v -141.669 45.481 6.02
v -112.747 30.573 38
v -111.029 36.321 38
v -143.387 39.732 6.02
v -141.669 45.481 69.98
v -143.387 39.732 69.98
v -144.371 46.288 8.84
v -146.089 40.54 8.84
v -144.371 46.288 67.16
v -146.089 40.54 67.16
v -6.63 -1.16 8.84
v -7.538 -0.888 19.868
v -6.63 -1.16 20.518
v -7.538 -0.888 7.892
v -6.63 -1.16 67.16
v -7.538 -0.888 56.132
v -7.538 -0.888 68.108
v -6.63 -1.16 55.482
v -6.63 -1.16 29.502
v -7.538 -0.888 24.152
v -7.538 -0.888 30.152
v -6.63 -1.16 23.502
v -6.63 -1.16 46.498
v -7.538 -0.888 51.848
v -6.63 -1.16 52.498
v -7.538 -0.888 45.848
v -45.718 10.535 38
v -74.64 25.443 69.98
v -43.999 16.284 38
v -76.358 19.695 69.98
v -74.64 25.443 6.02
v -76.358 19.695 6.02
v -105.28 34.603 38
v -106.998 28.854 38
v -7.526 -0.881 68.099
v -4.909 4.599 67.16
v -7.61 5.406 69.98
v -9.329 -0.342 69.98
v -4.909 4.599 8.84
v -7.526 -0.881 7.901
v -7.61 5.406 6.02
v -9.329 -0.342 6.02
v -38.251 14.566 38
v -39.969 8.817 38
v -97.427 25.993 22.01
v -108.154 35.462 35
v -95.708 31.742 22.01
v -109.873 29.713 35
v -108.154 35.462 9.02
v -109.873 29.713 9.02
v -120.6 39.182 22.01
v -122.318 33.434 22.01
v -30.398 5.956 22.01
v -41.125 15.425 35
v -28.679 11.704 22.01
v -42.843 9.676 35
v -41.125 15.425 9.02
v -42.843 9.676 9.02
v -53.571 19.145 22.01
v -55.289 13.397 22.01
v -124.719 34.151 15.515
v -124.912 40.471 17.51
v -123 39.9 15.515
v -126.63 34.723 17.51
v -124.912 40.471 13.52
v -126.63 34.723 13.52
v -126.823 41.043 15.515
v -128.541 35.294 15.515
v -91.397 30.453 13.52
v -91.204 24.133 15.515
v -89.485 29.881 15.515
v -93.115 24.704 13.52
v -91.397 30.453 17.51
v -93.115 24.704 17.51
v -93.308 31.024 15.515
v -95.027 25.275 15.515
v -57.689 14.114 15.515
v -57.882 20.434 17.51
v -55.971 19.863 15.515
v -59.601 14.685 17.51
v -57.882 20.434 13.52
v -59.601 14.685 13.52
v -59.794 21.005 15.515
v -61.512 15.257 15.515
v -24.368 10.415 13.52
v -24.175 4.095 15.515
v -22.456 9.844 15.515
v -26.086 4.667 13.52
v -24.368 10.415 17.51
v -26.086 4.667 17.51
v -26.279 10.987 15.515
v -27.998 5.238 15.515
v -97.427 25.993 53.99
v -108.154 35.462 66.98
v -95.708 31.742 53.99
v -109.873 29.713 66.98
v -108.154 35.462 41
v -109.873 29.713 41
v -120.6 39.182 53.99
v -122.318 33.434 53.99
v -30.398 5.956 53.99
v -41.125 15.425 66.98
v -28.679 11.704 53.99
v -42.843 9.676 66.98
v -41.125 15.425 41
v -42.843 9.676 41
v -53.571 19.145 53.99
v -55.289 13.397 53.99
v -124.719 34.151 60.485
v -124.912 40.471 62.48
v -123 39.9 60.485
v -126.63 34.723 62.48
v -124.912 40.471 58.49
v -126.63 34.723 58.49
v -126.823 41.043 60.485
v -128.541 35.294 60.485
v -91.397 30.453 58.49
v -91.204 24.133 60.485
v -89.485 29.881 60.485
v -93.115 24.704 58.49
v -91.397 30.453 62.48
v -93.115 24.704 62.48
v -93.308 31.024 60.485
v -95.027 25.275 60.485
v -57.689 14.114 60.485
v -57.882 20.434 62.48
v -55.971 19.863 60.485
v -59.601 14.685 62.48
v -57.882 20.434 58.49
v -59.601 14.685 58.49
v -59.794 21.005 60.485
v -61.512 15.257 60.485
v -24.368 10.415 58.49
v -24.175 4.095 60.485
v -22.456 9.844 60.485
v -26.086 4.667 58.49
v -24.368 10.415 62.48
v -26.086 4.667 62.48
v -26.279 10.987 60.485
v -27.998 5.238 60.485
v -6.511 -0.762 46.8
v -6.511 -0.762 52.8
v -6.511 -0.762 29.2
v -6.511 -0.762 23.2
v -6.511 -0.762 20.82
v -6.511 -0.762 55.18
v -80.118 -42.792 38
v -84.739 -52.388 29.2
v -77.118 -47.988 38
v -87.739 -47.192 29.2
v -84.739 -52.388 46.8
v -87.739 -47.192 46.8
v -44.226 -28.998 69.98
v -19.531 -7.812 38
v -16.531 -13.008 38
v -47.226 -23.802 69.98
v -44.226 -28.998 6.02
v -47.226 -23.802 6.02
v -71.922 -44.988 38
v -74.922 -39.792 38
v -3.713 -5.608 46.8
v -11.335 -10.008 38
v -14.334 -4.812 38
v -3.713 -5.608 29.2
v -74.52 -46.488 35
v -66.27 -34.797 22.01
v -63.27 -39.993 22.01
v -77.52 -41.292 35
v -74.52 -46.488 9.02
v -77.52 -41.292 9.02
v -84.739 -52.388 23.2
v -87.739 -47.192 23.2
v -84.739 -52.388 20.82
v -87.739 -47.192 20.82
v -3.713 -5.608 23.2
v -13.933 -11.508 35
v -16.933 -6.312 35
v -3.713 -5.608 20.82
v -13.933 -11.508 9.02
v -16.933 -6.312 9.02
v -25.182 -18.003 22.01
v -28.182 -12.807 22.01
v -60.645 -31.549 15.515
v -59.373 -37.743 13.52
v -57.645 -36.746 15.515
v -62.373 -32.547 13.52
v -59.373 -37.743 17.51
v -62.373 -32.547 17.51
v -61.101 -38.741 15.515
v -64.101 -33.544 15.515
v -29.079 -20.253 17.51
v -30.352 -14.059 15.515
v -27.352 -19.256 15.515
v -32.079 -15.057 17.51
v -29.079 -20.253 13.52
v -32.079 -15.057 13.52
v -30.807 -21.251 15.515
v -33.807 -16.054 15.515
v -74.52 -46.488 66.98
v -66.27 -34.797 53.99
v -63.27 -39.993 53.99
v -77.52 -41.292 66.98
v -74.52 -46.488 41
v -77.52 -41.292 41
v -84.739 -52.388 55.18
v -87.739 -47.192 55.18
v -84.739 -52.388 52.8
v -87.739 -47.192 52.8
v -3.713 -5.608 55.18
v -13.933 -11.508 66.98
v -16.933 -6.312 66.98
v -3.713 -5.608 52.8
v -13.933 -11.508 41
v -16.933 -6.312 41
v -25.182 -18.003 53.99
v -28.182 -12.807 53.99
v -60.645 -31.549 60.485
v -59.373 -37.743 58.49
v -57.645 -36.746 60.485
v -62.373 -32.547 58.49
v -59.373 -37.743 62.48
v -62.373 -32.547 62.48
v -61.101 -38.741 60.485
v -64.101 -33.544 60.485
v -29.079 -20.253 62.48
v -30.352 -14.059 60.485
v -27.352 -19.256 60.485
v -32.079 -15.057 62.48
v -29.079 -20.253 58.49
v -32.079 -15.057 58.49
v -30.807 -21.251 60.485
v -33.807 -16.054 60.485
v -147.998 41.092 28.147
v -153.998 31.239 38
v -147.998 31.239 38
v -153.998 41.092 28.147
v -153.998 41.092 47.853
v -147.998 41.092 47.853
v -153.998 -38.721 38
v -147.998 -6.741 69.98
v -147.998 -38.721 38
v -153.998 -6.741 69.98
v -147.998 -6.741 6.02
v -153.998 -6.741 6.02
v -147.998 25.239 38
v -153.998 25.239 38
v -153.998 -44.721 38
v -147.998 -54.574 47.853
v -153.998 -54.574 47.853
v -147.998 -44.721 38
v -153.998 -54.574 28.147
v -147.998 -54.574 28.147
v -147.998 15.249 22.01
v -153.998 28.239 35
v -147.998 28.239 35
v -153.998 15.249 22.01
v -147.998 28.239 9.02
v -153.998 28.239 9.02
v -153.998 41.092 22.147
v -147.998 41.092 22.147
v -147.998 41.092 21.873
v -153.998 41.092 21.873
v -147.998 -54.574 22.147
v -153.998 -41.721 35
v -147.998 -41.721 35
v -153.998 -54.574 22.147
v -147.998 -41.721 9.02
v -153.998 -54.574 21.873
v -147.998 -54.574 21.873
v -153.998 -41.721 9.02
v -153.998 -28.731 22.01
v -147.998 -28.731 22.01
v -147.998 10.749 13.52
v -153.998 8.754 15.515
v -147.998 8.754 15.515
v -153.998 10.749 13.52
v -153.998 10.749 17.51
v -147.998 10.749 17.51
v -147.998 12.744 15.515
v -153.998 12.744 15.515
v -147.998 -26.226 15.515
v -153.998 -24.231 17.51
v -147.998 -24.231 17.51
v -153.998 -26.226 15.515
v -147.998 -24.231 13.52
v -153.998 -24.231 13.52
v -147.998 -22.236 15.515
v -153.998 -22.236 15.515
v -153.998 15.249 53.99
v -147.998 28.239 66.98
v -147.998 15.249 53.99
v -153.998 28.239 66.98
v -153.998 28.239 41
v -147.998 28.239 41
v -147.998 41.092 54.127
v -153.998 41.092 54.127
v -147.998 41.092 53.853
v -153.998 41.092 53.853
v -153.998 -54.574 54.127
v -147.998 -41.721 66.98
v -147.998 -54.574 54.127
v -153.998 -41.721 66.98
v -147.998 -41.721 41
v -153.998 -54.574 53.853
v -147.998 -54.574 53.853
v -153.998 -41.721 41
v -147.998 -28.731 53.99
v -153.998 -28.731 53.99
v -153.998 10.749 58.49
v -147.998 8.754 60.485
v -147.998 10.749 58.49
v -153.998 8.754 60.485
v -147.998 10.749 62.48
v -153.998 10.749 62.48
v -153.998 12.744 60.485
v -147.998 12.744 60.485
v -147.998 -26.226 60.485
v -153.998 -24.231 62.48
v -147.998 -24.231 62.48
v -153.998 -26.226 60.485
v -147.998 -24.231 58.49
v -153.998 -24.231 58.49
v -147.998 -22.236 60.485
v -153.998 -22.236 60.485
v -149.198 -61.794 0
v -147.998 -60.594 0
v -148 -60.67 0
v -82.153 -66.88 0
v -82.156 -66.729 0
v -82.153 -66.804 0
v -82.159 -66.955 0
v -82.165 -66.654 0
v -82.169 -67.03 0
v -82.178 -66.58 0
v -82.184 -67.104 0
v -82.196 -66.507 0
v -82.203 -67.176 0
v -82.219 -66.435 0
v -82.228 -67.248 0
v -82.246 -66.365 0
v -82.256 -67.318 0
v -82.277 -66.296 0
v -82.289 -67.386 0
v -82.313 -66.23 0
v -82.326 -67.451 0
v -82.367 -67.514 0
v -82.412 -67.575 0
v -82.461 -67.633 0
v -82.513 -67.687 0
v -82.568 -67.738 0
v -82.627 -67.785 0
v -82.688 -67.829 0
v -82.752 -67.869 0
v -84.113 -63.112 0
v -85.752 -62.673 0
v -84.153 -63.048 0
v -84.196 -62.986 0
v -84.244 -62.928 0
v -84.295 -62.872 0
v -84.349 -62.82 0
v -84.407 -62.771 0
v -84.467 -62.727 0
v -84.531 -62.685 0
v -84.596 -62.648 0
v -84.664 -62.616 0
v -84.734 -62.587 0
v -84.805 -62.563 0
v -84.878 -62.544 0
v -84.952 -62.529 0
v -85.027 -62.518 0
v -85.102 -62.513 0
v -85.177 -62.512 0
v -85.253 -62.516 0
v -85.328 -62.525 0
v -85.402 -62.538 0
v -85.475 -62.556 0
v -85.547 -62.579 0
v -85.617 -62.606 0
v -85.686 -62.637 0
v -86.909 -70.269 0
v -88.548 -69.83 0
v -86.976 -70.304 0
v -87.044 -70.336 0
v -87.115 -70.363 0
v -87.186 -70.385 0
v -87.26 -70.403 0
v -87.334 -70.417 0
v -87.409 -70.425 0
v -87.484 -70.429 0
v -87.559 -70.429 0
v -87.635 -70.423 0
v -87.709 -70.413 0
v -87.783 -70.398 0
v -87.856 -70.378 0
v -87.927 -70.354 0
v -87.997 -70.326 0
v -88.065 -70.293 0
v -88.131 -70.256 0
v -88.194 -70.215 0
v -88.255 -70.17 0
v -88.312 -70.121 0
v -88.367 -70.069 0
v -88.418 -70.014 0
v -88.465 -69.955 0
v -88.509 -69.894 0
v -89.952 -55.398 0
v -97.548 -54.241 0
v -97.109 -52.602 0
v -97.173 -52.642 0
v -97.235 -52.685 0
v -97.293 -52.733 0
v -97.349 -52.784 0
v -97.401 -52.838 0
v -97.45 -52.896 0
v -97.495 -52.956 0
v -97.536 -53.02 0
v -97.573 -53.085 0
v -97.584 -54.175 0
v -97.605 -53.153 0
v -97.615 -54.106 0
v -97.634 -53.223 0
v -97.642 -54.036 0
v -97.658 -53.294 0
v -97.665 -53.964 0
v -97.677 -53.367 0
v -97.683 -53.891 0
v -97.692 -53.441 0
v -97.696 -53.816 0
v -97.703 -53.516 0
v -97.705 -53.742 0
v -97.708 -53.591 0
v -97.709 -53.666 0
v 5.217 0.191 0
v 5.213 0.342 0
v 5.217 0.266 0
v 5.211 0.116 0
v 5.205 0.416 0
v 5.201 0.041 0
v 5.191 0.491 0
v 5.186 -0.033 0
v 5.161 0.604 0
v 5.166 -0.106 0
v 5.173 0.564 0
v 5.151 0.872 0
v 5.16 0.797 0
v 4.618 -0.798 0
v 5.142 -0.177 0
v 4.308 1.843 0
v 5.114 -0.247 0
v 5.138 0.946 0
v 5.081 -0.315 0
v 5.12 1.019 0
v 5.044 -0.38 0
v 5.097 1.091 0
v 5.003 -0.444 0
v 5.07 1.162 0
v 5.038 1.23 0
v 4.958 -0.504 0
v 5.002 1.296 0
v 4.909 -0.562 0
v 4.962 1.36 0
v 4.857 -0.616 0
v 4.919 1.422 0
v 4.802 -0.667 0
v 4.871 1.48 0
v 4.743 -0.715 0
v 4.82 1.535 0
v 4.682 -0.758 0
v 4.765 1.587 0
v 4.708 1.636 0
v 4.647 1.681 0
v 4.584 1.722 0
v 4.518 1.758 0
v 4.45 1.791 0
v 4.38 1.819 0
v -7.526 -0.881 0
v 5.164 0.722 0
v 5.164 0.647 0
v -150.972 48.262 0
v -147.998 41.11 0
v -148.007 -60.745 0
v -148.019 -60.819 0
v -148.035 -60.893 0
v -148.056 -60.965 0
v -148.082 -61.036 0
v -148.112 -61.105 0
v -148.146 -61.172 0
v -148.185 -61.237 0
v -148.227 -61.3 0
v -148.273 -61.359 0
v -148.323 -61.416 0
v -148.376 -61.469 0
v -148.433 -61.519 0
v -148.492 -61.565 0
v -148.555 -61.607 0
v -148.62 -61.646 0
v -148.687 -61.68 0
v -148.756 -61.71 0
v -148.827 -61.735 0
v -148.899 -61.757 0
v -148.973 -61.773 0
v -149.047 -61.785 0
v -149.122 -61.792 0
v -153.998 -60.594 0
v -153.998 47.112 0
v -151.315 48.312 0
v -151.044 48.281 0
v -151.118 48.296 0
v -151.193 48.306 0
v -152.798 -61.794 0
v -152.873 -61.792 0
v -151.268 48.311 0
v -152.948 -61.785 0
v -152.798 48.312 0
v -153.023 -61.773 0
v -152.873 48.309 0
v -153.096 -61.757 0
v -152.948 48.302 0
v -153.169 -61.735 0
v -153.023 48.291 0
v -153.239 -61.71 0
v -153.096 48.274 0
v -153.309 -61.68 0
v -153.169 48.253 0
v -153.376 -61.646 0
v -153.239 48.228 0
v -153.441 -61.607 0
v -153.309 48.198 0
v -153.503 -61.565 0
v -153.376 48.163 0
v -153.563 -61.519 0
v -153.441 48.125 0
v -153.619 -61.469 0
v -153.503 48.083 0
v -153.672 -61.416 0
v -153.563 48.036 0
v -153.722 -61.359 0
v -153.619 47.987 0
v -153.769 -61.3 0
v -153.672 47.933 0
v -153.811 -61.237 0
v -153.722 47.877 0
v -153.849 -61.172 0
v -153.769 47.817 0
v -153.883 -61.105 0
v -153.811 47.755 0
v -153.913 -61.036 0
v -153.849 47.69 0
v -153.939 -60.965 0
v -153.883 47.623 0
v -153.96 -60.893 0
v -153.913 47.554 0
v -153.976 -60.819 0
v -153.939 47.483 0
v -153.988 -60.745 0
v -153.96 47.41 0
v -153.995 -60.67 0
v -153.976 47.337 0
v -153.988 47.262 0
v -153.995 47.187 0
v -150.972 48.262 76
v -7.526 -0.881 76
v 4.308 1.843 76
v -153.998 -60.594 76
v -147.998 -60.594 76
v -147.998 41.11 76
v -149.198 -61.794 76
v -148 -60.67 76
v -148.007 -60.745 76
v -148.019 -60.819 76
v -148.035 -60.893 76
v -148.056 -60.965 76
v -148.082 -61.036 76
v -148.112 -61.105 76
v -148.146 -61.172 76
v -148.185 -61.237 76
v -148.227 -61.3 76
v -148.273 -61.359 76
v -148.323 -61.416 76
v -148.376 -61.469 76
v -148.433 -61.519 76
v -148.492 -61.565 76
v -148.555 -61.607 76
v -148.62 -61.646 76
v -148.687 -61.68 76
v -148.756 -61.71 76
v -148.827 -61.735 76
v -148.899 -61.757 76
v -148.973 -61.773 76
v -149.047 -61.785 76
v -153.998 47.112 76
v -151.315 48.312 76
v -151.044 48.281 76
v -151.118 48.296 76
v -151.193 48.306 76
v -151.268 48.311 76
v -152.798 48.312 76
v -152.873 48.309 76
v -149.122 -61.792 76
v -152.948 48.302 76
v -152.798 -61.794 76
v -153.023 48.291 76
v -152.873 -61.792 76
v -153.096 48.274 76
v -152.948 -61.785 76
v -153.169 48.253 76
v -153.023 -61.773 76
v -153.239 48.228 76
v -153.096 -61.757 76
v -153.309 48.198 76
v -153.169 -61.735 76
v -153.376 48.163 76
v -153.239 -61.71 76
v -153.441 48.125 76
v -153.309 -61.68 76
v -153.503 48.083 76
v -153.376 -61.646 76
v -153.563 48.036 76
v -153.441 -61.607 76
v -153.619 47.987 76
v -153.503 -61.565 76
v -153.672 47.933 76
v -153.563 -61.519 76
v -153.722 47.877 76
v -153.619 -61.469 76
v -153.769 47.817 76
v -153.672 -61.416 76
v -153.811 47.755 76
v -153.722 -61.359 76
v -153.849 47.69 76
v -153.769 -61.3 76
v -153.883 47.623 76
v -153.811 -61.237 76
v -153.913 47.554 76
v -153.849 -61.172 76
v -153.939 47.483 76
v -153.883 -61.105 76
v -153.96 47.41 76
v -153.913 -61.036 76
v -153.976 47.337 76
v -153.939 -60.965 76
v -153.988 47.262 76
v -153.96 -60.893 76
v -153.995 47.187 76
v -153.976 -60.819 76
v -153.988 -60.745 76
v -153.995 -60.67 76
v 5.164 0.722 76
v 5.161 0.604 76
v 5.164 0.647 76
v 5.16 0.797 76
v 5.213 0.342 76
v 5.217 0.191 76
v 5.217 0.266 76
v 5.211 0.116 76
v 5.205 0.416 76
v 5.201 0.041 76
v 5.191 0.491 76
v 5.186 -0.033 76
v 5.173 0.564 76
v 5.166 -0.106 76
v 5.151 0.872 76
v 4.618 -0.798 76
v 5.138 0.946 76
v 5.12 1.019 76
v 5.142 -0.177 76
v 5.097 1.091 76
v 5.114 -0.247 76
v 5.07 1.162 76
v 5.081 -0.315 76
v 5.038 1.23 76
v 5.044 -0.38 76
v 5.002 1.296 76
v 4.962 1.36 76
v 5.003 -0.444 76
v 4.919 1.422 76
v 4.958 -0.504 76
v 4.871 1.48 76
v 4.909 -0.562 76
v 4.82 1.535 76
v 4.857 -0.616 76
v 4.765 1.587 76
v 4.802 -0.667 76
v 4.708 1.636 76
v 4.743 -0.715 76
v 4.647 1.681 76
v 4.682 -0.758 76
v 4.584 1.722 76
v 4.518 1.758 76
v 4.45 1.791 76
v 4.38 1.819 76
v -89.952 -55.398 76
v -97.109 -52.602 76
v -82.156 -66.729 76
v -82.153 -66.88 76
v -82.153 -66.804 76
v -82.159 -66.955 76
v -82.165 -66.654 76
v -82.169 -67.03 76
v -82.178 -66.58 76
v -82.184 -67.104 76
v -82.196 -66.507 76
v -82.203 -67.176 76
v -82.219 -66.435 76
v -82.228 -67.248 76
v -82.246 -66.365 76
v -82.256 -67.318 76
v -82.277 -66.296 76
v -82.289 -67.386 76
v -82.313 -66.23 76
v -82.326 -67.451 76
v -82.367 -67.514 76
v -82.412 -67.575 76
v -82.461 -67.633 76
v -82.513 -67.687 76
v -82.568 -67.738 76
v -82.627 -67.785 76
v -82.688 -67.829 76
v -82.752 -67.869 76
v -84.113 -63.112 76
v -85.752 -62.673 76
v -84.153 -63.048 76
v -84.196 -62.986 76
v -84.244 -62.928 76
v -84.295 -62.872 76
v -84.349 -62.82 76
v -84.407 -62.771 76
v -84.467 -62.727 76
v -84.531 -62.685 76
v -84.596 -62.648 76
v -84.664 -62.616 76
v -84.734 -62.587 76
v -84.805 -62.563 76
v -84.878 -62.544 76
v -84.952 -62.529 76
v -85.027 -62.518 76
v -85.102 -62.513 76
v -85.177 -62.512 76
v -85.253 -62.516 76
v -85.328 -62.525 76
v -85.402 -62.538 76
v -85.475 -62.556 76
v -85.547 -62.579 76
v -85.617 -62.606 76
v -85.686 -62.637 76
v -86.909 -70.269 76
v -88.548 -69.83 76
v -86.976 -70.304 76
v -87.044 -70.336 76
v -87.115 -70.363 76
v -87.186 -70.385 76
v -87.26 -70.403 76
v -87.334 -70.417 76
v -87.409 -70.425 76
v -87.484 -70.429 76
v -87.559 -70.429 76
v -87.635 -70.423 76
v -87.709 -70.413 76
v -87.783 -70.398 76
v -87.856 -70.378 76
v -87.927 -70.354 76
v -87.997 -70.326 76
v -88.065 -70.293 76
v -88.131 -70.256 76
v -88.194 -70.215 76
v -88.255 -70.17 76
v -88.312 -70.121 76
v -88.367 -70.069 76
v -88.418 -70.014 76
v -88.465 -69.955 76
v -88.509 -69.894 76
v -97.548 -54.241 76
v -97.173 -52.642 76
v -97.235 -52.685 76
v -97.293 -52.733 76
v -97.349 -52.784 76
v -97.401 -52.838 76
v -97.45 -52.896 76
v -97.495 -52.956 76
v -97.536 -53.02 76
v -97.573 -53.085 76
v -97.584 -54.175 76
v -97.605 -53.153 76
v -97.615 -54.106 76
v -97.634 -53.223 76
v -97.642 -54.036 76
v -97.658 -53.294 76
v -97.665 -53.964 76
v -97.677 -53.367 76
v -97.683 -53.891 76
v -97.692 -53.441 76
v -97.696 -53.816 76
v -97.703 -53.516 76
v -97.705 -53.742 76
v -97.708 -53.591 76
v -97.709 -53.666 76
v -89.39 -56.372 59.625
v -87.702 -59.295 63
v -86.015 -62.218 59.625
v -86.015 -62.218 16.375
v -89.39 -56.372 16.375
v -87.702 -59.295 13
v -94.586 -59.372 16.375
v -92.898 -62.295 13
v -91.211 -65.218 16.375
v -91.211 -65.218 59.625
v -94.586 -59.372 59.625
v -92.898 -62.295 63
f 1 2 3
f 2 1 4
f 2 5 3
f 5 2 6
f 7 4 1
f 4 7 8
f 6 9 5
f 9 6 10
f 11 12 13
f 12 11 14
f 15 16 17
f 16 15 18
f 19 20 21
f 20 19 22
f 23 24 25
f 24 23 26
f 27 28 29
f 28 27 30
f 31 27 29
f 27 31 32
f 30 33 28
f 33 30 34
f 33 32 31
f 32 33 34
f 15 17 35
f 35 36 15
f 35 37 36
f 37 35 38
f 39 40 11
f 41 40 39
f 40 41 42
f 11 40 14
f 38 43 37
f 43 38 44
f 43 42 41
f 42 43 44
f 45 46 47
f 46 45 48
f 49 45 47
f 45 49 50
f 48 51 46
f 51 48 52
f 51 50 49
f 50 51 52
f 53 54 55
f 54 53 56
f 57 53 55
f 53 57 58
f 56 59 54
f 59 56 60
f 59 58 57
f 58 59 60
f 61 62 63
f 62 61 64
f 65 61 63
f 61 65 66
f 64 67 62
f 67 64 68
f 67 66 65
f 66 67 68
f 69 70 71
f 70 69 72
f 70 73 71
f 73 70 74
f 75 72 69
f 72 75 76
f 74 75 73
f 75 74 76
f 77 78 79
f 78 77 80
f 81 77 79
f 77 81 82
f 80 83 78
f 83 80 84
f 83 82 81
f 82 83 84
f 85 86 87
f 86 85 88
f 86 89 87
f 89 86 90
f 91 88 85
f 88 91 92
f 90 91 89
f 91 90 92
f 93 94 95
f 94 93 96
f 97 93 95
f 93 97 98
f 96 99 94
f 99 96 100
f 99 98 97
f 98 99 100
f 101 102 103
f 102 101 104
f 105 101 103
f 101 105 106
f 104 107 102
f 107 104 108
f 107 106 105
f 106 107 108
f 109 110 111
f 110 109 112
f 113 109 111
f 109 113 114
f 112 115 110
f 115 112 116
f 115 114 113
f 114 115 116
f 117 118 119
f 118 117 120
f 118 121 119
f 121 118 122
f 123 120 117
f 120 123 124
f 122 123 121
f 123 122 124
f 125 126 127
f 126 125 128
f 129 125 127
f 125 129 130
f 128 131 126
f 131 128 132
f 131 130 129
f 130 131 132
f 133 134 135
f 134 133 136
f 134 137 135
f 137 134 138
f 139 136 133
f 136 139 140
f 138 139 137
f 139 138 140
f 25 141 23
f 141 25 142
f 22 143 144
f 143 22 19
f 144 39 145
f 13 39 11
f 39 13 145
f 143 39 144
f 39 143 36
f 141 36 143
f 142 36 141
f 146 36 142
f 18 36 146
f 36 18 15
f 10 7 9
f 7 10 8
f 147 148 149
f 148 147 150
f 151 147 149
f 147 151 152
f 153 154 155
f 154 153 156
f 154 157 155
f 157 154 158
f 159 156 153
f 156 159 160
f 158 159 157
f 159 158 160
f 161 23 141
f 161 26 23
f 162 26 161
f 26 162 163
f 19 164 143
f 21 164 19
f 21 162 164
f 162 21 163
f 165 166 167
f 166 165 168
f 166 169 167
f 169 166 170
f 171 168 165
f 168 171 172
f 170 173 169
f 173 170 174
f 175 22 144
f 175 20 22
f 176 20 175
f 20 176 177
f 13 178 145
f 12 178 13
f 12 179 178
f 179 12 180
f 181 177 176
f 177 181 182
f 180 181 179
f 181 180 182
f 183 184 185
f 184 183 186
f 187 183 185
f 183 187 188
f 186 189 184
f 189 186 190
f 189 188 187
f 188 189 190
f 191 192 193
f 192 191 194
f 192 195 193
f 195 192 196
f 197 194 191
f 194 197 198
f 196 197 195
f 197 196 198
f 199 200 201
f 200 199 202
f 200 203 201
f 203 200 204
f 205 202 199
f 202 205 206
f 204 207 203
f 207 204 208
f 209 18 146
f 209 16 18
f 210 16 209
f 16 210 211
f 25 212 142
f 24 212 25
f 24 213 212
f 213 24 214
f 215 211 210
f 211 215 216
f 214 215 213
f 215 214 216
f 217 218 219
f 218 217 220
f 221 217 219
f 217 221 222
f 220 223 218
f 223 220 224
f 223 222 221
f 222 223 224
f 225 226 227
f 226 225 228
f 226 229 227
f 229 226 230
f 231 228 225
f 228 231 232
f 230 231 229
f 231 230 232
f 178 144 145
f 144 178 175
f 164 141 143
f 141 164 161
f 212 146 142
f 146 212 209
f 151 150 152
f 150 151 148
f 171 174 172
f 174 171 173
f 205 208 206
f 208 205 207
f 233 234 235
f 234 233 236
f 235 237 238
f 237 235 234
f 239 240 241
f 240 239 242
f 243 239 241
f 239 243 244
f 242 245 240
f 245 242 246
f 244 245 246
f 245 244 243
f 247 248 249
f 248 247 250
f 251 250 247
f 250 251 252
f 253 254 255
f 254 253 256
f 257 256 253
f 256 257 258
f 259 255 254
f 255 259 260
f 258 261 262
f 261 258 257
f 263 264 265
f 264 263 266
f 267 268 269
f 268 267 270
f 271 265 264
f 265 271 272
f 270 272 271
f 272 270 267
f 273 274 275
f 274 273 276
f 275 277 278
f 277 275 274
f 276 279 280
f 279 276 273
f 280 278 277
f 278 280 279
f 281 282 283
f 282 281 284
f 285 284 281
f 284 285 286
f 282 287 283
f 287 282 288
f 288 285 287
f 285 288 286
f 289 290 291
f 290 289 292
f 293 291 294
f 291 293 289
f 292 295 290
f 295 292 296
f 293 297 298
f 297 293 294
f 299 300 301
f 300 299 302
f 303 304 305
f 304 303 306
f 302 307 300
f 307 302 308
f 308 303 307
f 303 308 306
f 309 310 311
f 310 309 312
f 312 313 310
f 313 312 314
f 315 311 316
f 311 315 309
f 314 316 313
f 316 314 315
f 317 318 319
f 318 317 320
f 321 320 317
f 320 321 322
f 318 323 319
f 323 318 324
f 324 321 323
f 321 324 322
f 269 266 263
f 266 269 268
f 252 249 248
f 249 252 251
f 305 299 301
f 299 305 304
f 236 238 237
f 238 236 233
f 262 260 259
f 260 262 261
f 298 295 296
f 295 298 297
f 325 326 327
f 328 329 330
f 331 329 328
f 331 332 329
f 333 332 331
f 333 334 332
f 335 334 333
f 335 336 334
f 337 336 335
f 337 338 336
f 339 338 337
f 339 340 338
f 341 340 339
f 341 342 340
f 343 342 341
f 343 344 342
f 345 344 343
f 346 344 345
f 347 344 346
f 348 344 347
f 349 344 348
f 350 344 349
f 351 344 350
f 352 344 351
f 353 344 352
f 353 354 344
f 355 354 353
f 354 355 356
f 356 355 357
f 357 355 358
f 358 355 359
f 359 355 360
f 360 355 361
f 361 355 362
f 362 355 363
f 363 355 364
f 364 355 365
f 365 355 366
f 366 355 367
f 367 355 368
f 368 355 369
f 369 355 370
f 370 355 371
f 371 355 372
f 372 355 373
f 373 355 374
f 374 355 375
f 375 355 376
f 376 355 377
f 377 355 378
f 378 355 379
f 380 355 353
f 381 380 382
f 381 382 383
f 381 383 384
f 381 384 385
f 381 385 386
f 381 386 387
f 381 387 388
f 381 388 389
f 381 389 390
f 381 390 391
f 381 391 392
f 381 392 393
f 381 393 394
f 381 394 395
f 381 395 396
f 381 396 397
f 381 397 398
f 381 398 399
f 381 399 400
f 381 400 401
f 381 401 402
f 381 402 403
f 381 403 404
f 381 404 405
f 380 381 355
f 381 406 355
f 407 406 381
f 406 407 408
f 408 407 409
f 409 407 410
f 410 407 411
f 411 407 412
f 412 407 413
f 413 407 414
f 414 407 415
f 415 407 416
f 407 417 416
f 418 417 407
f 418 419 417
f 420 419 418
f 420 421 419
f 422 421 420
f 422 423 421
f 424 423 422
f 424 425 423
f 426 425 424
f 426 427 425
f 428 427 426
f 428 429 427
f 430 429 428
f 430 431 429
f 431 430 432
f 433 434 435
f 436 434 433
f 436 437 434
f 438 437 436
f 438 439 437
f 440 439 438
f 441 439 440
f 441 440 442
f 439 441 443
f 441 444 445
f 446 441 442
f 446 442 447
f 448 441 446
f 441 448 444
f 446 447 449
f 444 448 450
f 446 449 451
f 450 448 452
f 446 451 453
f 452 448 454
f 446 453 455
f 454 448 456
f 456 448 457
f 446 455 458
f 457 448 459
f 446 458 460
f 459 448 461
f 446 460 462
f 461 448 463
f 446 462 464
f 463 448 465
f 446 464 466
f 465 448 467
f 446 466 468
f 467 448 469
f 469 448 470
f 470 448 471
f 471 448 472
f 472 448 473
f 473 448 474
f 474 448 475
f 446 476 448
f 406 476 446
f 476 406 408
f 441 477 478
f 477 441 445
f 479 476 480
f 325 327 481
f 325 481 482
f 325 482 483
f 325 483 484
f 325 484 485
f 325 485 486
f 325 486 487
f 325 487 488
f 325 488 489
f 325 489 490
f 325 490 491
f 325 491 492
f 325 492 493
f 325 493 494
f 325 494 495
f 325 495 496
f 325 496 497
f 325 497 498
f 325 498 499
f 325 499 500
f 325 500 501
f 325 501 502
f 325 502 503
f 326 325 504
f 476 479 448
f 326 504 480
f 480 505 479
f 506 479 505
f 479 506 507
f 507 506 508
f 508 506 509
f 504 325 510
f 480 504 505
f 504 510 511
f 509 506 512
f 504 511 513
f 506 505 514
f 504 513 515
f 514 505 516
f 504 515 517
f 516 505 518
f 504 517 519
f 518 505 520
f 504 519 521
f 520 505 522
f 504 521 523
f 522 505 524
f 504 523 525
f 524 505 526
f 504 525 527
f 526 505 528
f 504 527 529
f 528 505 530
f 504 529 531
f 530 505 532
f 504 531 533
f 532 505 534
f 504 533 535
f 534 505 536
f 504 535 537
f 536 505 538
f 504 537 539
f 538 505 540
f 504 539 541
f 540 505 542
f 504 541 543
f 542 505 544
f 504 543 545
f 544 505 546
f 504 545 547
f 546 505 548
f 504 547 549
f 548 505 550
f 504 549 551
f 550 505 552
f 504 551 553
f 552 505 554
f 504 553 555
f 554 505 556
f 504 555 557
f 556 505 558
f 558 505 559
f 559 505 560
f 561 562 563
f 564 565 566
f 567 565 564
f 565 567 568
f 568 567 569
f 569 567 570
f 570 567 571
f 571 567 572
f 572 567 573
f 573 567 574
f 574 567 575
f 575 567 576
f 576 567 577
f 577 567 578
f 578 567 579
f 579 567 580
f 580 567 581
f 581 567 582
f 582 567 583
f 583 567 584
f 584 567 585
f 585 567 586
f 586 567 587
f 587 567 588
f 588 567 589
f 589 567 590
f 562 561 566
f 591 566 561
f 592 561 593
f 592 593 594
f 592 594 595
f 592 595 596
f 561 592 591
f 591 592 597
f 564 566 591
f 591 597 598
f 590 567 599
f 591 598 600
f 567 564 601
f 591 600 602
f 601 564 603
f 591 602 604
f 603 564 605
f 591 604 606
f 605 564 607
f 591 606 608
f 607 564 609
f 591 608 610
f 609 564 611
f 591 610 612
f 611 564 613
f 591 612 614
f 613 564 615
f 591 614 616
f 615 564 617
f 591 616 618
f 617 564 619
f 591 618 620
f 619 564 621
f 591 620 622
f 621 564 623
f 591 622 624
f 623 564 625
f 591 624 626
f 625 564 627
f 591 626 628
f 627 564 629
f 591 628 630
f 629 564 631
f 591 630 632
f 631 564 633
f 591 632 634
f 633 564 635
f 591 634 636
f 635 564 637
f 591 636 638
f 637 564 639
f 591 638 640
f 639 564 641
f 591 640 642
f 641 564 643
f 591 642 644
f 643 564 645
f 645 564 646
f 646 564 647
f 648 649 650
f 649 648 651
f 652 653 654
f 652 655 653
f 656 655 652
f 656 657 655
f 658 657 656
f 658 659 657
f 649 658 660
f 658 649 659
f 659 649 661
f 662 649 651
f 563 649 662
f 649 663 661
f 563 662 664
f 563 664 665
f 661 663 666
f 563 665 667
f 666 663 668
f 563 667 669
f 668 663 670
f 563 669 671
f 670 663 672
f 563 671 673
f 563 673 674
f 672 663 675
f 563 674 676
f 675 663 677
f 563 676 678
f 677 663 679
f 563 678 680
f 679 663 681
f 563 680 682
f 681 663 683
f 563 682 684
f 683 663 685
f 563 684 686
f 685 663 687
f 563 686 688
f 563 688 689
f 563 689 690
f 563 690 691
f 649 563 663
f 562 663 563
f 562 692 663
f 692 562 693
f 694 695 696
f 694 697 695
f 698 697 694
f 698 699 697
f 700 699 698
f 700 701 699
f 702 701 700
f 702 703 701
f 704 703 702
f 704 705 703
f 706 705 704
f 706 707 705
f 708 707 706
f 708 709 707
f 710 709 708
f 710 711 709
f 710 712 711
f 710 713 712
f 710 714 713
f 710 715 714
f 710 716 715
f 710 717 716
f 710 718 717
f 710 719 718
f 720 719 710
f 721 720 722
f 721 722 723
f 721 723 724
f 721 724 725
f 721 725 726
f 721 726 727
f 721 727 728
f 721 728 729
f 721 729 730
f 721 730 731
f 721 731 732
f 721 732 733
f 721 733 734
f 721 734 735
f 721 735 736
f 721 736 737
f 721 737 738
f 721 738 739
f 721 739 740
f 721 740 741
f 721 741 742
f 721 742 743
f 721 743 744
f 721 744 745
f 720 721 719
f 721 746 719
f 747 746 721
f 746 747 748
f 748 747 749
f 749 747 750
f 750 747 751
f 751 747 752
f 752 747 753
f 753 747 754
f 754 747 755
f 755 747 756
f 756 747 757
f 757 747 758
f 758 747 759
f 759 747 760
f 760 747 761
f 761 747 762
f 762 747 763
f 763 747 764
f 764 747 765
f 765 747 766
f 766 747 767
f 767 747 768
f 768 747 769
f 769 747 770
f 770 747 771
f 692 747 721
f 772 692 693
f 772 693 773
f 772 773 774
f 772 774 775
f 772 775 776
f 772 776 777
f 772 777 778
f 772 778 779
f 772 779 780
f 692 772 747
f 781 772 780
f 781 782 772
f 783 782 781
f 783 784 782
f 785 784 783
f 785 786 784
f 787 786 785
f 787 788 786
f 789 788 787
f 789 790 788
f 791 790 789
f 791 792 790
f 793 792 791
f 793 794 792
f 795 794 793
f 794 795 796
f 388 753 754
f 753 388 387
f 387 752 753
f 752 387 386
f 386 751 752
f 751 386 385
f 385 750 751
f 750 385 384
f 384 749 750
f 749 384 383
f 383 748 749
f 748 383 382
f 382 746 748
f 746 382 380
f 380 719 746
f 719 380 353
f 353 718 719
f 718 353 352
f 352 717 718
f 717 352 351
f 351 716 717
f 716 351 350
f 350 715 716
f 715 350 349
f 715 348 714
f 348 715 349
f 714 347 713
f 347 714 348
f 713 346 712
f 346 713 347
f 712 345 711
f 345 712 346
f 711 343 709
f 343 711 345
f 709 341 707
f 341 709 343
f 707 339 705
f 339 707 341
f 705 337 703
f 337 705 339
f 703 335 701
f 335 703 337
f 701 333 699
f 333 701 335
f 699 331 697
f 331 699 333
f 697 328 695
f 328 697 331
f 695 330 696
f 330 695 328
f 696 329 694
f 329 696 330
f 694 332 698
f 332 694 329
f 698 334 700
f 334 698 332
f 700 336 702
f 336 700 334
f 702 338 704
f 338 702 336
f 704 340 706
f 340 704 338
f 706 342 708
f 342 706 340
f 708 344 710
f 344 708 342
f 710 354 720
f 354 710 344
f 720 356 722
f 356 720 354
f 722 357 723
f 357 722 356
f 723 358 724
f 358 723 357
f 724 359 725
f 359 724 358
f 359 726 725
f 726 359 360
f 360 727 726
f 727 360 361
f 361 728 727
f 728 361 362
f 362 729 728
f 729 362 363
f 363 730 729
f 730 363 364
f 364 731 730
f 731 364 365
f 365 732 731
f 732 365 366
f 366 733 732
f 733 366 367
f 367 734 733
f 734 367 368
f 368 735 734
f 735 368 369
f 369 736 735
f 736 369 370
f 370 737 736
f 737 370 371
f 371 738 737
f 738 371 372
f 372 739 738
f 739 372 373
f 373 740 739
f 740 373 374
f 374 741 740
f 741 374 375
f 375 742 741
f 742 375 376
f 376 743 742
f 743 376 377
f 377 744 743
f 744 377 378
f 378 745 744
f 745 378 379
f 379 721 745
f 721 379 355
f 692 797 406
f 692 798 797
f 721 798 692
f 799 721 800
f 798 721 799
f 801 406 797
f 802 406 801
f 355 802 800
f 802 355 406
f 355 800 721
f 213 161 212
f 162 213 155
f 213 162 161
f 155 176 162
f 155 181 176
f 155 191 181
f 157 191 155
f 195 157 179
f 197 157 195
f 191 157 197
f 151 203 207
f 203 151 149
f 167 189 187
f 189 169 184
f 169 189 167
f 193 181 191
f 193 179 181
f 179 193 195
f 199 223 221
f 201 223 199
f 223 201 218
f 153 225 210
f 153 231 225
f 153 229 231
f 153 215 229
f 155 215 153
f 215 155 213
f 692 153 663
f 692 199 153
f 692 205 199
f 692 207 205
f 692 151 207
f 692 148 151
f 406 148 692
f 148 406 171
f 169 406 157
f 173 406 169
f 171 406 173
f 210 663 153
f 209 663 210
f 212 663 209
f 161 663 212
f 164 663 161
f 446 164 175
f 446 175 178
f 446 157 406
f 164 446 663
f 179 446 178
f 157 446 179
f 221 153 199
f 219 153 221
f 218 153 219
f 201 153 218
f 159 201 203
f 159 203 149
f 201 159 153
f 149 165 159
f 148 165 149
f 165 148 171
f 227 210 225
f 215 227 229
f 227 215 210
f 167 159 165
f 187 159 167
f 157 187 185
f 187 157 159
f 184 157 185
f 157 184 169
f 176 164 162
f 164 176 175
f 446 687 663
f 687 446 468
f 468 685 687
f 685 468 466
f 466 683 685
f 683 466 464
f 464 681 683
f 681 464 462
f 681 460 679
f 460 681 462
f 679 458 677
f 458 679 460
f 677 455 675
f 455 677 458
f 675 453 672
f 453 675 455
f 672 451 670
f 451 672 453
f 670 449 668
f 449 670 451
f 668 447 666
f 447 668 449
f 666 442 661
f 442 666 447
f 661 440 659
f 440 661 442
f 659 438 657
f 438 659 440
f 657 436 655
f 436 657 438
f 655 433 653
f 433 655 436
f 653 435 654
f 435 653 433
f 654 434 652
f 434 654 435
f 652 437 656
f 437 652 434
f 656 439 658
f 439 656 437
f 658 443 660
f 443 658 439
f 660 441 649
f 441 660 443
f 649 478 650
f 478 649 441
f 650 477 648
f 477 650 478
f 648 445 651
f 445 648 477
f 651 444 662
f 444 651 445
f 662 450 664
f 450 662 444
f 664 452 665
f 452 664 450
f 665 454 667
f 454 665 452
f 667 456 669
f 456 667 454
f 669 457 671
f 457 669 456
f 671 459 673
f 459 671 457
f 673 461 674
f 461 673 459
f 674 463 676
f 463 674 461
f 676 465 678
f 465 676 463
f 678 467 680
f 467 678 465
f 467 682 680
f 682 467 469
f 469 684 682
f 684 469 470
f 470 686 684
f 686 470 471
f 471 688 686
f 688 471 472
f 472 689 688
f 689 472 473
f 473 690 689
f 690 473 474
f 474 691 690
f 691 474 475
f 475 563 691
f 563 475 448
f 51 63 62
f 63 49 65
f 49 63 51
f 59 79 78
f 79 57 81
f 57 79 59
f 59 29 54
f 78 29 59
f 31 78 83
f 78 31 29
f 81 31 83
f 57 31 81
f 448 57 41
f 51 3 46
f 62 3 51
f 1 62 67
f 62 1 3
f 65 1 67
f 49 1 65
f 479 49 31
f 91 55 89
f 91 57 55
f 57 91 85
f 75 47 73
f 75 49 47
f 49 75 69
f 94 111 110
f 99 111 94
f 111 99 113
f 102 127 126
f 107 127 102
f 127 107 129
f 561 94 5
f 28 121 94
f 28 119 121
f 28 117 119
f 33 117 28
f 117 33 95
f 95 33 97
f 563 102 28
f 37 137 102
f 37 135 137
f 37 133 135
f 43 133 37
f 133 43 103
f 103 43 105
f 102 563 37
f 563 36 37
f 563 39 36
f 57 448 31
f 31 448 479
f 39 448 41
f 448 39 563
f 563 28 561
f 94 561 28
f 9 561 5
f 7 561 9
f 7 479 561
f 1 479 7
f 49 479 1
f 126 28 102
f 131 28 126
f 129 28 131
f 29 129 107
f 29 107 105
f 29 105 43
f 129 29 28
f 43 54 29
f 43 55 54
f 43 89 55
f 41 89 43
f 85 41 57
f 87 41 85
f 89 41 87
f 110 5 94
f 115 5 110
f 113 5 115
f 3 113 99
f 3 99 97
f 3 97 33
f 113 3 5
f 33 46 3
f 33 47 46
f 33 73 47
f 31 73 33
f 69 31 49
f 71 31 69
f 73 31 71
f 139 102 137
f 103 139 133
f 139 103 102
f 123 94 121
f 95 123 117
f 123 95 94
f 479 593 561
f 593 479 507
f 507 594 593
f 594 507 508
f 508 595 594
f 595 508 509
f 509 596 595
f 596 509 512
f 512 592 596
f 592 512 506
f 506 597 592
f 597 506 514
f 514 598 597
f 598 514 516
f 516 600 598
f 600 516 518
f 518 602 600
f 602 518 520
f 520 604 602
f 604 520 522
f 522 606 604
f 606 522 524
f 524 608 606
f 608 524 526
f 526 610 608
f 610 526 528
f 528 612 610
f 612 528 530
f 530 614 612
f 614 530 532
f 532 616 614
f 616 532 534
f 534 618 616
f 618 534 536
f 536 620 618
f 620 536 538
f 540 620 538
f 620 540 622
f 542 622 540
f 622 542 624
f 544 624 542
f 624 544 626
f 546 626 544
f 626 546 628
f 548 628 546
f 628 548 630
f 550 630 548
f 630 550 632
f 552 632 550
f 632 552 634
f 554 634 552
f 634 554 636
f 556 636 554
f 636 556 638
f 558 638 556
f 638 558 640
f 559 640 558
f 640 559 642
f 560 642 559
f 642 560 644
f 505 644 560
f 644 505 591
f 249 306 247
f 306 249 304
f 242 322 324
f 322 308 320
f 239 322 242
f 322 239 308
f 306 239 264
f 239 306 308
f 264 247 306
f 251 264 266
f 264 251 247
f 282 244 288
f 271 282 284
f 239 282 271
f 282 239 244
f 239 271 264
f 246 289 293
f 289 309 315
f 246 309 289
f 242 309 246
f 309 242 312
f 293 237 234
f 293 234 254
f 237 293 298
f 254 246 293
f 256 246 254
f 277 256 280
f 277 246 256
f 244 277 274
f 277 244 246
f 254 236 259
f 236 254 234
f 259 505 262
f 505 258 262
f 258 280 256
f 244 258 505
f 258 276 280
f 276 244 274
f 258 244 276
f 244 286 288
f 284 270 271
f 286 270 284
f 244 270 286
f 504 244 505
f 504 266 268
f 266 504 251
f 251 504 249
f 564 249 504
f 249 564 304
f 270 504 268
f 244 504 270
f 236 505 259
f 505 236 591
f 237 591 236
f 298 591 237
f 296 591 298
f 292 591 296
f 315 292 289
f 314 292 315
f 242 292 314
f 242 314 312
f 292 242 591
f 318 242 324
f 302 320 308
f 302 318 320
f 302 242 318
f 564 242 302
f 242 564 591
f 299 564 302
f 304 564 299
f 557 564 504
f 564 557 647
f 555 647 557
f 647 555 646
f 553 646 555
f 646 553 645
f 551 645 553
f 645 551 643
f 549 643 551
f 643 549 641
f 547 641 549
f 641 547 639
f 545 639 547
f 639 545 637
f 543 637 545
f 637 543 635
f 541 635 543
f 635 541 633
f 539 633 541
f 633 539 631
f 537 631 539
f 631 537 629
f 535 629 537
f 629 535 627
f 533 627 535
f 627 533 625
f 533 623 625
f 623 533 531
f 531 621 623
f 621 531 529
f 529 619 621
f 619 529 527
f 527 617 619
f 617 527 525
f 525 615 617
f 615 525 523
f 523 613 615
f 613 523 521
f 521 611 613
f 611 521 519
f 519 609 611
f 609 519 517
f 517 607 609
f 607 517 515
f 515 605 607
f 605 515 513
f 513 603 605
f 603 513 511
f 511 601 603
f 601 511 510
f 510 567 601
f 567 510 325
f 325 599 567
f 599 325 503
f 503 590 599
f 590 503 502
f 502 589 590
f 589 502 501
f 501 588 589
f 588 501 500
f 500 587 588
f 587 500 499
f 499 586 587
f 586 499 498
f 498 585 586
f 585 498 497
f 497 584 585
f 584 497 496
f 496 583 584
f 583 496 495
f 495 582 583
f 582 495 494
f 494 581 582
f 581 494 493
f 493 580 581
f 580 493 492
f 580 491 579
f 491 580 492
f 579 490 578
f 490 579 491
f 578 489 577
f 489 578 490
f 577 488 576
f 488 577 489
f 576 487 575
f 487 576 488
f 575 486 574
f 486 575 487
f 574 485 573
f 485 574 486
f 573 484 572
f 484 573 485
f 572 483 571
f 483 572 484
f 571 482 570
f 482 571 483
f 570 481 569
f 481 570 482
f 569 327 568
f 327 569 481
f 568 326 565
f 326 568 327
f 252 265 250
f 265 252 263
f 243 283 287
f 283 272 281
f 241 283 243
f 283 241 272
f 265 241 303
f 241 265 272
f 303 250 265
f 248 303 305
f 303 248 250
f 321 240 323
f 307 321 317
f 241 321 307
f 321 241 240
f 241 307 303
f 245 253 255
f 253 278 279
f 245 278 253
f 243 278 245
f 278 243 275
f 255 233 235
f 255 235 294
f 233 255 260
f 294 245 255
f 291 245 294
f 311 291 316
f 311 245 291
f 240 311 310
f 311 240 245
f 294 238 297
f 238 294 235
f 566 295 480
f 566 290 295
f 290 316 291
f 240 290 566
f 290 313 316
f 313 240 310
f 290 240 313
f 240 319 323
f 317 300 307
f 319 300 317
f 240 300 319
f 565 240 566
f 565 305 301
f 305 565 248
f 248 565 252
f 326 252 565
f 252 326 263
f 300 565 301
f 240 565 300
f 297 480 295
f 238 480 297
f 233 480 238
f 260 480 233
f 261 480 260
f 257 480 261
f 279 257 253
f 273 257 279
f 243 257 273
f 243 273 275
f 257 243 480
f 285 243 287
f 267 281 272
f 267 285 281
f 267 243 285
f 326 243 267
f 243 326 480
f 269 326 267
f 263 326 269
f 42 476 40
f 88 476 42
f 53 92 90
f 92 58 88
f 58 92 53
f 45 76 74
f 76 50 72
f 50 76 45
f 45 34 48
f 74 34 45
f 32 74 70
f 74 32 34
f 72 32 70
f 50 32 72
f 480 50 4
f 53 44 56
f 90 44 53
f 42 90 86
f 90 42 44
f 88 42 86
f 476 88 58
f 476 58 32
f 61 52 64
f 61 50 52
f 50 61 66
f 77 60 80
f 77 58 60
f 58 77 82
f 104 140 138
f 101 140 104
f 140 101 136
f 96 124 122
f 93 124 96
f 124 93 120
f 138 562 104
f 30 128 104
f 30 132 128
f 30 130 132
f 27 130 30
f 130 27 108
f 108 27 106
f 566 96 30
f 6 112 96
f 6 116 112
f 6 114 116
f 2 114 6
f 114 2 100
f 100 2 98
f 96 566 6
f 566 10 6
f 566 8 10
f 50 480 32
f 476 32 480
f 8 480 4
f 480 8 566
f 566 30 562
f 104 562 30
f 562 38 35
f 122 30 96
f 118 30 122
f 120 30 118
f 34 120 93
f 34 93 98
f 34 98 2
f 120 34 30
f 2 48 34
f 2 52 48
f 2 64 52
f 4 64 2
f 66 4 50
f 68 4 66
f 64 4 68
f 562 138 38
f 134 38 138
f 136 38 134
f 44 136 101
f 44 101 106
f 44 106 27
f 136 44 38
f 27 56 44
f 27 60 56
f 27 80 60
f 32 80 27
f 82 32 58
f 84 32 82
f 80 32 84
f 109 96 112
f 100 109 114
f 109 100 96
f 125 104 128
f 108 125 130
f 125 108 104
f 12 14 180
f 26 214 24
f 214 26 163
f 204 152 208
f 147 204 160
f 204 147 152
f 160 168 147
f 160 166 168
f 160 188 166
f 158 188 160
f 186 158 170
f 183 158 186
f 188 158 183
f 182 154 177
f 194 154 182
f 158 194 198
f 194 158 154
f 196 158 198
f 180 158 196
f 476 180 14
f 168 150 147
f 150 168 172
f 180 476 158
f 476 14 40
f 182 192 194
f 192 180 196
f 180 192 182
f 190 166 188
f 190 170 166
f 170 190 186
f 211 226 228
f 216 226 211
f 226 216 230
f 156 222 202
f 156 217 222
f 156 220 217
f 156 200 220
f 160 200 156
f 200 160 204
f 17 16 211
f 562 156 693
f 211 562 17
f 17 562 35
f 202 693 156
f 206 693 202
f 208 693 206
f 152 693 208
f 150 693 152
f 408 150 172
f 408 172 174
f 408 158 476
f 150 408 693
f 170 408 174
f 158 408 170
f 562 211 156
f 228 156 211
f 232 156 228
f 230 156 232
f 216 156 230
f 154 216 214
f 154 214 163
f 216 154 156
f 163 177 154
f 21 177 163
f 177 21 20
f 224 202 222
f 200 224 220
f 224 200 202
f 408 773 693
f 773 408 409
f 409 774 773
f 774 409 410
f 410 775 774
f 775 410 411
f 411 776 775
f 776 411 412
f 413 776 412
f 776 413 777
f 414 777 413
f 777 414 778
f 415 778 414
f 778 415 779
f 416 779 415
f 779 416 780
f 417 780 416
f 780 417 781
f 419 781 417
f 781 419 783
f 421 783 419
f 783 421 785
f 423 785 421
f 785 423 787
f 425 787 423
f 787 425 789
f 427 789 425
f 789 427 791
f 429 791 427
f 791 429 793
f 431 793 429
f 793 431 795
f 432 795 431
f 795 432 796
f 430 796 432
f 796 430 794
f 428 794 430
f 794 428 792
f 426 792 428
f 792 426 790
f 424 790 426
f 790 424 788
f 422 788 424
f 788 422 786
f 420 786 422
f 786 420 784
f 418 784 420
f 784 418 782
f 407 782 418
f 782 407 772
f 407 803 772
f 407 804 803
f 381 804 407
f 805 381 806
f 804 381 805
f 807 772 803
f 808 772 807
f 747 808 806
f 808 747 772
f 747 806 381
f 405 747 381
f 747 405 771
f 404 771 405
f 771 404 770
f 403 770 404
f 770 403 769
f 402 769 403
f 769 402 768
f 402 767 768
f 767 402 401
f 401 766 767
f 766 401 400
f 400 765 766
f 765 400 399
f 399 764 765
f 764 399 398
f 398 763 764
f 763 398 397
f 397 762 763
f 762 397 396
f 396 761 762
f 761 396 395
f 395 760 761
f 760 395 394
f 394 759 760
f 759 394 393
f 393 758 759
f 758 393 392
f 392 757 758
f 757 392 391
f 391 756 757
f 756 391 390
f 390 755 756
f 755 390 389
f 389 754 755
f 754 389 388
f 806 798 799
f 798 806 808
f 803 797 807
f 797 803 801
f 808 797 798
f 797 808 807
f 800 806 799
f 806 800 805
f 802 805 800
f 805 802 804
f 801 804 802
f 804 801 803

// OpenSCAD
// Angle of the phone standing
Phone_Angle=30; //[10:80]
Phone_Height=160;
Phone_Width=76;
Phone_Depthd=9;
// Part of the phone on the stand
Phone_Ratio=66; // [55:95]
Stand_Wall_Width=6; //[1:20]
// Gap under the phone
Stand_Gap=20; // [3:50]
// Positioning of decorative cut in the walls
Stand_Decorations_Position= 0; // [0:odd, 1:even]
// Cables and speackers cut (can not be more then phone width minus double wall width)
Cable_Cut_length=50;
Cable_Cut_Width_Ratio= 75; // [10:100]
// (higher number mean sharper)
Wall_Rounding_Ratio=60; //[30:80]

/*[Hidden]*/

$fn=100;

Phone_Ratio1= Phone_Ratio/100.0;
Cable_Cut_Width_Ratio1= Cable_Cut_Width_Ratio/100.0;
Wall_Rounding_Ratio1= Wall_Rounding_Ratio/100.0;

Cable_Cut_length2= min(Phone_Width-2*Stand_Wall_Width, Cable_Cut_length);

st_ln_p= Phone_Height * Phone_Ratio1;
st_ln_g= Stand_Gap/sin(Phone_Angle);
st_ln_w= Stand_Wall_Width/sin(Phone_Angle);
st_ln= st_ln_p + st_ln_g + st_ln_w;
st_h= st_ln*sin(Phone_Angle);
echo("side length:", st_ln, st_ln_p, st_ln_g, st_ln_w, st_h);
st_cw= Stand_Wall_Width*Wall_Rounding_Ratio1;
st_sw= (Stand_Wall_Width - st_cw)/2;

st_o1= cos(Phone_Angle)*(Phone_Height*(1-Phone_Ratio1));
st_b=atan2(st_o1, st_ln);
echo("Beta:", st_b);
st_o2= sin(Phone_Angle)*Phone_Height*Phone_Ratio1 + cos(Phone_Angle)*Phone_Depthd;

Cable_Cut_lengthw= Phone_Width-2*Stand_Wall_Width;

Cable_Cut_length1=min (Cable_Cut_lengthw, st_ln_p - Stand_Wall_Width*2);


module cut1 (cut=60, gap= 5, h=100, w=20, step= 0)
{
    side= cut/sin(45)/2;
    interval= (step ? step : gap + cut);
    n= floor(h/interval);
    intersection()
    {

        cube([h, w, cut]);
        union()
        {
            for(s= [0:n])
            {
                translate([cut/2 + s*interval,0,cut/2])
                rotate([0,45,0])
                translate([-side/2, 0, -side/2])
                cube([side, w, side]);
    
            }
            if (cut/2 > gap)
            {
                new_cut= cut/2-gap;
                translate([-(gap + new_cut)/2, 0, (cut/2 - new_cut/2) -  (gap + new_cut)/2])
                cut1(cut=new_cut, gap= gap*1.5, h=h+(gap + new_cut)/2, w=w, step= interval/2);
                new_cut= cut/2-gap;
                translate([-(gap + new_cut)/2, 0, (cut/2 - new_cut/2) +  (gap + new_cut)/2])
                cut1(cut=new_cut, gap= gap*1.5, h=h+(gap + new_cut)/2, w=w, step= interval/2);
            }
        }
    }
}

module cut(gap= 5, h=100, l=50, w=6, step= 0)
{
    //%cube([h,w,l]);
    hw= h - 2*w;
    lw= l - 2*w;
    cut= min (hw, lw);
    if (h >= l)
    {
        n= ceil(h/(cut + gap));
        nn= ((Stand_Decorations_Position && (n % 2 == 1)) || (!Stand_Decorations_Position && (n % 2 == 0)) ) ? n+1 : n;
 
        hww= nn*(cut + gap);
        translate([w,0,w])
        intersection()
        {
            cube([hw,w,lw]);
            translate([-(hww-hw)/2 + gap/2, 0, 0])
            cut1 (cut=cut, gap=gap, h=hww, w= w);
        }
    }
    else
    {
        n= ceil(l/(cut + gap));
        nn= ((Stand_Decorations_Position && (n % 2 == 1)) || (!Stand_Decorations_Position && (n % 2 == 0)) ) ? n+1 : n;
        
        lww= nn*(cut + gap);
        translate([cut + w,0,w])
        rotate([0,-90,0])
        intersection()
        {
            cube([lw,w,hw]);
            translate([-(lww-lw)/2 + gap/2, 0, 0])
            cut1 (cut=cut, gap=gap, h=lww, w= w);
        }
    }
}


difference()
{
    linear_extrude(Phone_Width, center = false, convexity = 10)
    offset(r=st_sw)
    difference()
    {
        union()
        {
            rotate(Phone_Angle)
            union()
            {
                l= st_ln_p + st_sw;
                s= Phone_Depthd + Stand_Wall_Width*2 - st_sw * 4;
                translate([-l, -st_cw/2])
                square([l + st_cw, st_cw], center=false);
                translate([-l - st_cw, -(s-st_cw/2)])
                square([st_cw, s], center=false);
                translate([-l - st_cw, -s])
                square([st_cw + st_sw, st_cw], center=false);
            }
            rotate(-st_b)
            translate([-st_ln, -st_cw/2])
            square([st_ln + st_cw, st_cw], center=false);
            translate([-cos(st_b)*st_ln - st_cw/2, -st_o2])
            square([st_cw, st_o1+st_o2], center=false);
        }
        //clear artefacts around line joins
        rotate(-st_b)
        translate([-st_ln*2, st_cw/2])
        square([st_ln*4, st_cw*4], center=false);
        rotate(Phone_Angle)
        translate([-st_ln_p, -st_cw-st_cw*3.5])
        square([st_ln_p*2, st_cw*4], center=false);
    }
    // cut in the back wall
    rotate(-st_b)
    translate([-st_ln, -Stand_Wall_Width/2 - 0.01, 0])
    cut(gap=Stand_Wall_Width, h=st_ln, l=Phone_Width, w= Stand_Wall_Width+0.02);
    // cut in the front wall
    rotate(Phone_Angle)
    translate([-st_ln_p, -Stand_Wall_Width/2 - 0.01, 0])
    cut(gap=Stand_Wall_Width, h=st_ln_p, l= Phone_Width, w= Stand_Wall_Width+0.02);
    // cut in the stand
    translate([-cos(st_b)*st_ln - Stand_Wall_Width/2 - 0.01, st_o1, 0])
    rotate(-90)
    cut(gap=Stand_Wall_Width, h=st_o2+st_o1, l= Phone_Width, w=Stand_Wall_Width+0.02);

    // Cut for wires and speakers
    c1= Phone_Depthd*(1-Cable_Cut_Width_Ratio1)/2;
    c2= Phone_Depthd-c1;
    cs= Phone_Depthd*Cable_Cut_Width_Ratio1/2;
    rotate([90,0,Phone_Angle +90 +180])
    translate([Stand_Wall_Width/2, (Phone_Width-Cable_Cut_length2)/2 , st_ln_p - Stand_Wall_Width/2])
    linear_extrude(Stand_Wall_Width*2, center = false, convexity = 10)
    polygon(points=[[Phone_Depthd/2, 0],
                    [c2, cs],
                    [c2, Cable_Cut_length2-cs],
                    [Phone_Depthd/2, Cable_Cut_length2],
                    [c1, Cable_Cut_length2-cs],
                    [c1, cs]]);
}
